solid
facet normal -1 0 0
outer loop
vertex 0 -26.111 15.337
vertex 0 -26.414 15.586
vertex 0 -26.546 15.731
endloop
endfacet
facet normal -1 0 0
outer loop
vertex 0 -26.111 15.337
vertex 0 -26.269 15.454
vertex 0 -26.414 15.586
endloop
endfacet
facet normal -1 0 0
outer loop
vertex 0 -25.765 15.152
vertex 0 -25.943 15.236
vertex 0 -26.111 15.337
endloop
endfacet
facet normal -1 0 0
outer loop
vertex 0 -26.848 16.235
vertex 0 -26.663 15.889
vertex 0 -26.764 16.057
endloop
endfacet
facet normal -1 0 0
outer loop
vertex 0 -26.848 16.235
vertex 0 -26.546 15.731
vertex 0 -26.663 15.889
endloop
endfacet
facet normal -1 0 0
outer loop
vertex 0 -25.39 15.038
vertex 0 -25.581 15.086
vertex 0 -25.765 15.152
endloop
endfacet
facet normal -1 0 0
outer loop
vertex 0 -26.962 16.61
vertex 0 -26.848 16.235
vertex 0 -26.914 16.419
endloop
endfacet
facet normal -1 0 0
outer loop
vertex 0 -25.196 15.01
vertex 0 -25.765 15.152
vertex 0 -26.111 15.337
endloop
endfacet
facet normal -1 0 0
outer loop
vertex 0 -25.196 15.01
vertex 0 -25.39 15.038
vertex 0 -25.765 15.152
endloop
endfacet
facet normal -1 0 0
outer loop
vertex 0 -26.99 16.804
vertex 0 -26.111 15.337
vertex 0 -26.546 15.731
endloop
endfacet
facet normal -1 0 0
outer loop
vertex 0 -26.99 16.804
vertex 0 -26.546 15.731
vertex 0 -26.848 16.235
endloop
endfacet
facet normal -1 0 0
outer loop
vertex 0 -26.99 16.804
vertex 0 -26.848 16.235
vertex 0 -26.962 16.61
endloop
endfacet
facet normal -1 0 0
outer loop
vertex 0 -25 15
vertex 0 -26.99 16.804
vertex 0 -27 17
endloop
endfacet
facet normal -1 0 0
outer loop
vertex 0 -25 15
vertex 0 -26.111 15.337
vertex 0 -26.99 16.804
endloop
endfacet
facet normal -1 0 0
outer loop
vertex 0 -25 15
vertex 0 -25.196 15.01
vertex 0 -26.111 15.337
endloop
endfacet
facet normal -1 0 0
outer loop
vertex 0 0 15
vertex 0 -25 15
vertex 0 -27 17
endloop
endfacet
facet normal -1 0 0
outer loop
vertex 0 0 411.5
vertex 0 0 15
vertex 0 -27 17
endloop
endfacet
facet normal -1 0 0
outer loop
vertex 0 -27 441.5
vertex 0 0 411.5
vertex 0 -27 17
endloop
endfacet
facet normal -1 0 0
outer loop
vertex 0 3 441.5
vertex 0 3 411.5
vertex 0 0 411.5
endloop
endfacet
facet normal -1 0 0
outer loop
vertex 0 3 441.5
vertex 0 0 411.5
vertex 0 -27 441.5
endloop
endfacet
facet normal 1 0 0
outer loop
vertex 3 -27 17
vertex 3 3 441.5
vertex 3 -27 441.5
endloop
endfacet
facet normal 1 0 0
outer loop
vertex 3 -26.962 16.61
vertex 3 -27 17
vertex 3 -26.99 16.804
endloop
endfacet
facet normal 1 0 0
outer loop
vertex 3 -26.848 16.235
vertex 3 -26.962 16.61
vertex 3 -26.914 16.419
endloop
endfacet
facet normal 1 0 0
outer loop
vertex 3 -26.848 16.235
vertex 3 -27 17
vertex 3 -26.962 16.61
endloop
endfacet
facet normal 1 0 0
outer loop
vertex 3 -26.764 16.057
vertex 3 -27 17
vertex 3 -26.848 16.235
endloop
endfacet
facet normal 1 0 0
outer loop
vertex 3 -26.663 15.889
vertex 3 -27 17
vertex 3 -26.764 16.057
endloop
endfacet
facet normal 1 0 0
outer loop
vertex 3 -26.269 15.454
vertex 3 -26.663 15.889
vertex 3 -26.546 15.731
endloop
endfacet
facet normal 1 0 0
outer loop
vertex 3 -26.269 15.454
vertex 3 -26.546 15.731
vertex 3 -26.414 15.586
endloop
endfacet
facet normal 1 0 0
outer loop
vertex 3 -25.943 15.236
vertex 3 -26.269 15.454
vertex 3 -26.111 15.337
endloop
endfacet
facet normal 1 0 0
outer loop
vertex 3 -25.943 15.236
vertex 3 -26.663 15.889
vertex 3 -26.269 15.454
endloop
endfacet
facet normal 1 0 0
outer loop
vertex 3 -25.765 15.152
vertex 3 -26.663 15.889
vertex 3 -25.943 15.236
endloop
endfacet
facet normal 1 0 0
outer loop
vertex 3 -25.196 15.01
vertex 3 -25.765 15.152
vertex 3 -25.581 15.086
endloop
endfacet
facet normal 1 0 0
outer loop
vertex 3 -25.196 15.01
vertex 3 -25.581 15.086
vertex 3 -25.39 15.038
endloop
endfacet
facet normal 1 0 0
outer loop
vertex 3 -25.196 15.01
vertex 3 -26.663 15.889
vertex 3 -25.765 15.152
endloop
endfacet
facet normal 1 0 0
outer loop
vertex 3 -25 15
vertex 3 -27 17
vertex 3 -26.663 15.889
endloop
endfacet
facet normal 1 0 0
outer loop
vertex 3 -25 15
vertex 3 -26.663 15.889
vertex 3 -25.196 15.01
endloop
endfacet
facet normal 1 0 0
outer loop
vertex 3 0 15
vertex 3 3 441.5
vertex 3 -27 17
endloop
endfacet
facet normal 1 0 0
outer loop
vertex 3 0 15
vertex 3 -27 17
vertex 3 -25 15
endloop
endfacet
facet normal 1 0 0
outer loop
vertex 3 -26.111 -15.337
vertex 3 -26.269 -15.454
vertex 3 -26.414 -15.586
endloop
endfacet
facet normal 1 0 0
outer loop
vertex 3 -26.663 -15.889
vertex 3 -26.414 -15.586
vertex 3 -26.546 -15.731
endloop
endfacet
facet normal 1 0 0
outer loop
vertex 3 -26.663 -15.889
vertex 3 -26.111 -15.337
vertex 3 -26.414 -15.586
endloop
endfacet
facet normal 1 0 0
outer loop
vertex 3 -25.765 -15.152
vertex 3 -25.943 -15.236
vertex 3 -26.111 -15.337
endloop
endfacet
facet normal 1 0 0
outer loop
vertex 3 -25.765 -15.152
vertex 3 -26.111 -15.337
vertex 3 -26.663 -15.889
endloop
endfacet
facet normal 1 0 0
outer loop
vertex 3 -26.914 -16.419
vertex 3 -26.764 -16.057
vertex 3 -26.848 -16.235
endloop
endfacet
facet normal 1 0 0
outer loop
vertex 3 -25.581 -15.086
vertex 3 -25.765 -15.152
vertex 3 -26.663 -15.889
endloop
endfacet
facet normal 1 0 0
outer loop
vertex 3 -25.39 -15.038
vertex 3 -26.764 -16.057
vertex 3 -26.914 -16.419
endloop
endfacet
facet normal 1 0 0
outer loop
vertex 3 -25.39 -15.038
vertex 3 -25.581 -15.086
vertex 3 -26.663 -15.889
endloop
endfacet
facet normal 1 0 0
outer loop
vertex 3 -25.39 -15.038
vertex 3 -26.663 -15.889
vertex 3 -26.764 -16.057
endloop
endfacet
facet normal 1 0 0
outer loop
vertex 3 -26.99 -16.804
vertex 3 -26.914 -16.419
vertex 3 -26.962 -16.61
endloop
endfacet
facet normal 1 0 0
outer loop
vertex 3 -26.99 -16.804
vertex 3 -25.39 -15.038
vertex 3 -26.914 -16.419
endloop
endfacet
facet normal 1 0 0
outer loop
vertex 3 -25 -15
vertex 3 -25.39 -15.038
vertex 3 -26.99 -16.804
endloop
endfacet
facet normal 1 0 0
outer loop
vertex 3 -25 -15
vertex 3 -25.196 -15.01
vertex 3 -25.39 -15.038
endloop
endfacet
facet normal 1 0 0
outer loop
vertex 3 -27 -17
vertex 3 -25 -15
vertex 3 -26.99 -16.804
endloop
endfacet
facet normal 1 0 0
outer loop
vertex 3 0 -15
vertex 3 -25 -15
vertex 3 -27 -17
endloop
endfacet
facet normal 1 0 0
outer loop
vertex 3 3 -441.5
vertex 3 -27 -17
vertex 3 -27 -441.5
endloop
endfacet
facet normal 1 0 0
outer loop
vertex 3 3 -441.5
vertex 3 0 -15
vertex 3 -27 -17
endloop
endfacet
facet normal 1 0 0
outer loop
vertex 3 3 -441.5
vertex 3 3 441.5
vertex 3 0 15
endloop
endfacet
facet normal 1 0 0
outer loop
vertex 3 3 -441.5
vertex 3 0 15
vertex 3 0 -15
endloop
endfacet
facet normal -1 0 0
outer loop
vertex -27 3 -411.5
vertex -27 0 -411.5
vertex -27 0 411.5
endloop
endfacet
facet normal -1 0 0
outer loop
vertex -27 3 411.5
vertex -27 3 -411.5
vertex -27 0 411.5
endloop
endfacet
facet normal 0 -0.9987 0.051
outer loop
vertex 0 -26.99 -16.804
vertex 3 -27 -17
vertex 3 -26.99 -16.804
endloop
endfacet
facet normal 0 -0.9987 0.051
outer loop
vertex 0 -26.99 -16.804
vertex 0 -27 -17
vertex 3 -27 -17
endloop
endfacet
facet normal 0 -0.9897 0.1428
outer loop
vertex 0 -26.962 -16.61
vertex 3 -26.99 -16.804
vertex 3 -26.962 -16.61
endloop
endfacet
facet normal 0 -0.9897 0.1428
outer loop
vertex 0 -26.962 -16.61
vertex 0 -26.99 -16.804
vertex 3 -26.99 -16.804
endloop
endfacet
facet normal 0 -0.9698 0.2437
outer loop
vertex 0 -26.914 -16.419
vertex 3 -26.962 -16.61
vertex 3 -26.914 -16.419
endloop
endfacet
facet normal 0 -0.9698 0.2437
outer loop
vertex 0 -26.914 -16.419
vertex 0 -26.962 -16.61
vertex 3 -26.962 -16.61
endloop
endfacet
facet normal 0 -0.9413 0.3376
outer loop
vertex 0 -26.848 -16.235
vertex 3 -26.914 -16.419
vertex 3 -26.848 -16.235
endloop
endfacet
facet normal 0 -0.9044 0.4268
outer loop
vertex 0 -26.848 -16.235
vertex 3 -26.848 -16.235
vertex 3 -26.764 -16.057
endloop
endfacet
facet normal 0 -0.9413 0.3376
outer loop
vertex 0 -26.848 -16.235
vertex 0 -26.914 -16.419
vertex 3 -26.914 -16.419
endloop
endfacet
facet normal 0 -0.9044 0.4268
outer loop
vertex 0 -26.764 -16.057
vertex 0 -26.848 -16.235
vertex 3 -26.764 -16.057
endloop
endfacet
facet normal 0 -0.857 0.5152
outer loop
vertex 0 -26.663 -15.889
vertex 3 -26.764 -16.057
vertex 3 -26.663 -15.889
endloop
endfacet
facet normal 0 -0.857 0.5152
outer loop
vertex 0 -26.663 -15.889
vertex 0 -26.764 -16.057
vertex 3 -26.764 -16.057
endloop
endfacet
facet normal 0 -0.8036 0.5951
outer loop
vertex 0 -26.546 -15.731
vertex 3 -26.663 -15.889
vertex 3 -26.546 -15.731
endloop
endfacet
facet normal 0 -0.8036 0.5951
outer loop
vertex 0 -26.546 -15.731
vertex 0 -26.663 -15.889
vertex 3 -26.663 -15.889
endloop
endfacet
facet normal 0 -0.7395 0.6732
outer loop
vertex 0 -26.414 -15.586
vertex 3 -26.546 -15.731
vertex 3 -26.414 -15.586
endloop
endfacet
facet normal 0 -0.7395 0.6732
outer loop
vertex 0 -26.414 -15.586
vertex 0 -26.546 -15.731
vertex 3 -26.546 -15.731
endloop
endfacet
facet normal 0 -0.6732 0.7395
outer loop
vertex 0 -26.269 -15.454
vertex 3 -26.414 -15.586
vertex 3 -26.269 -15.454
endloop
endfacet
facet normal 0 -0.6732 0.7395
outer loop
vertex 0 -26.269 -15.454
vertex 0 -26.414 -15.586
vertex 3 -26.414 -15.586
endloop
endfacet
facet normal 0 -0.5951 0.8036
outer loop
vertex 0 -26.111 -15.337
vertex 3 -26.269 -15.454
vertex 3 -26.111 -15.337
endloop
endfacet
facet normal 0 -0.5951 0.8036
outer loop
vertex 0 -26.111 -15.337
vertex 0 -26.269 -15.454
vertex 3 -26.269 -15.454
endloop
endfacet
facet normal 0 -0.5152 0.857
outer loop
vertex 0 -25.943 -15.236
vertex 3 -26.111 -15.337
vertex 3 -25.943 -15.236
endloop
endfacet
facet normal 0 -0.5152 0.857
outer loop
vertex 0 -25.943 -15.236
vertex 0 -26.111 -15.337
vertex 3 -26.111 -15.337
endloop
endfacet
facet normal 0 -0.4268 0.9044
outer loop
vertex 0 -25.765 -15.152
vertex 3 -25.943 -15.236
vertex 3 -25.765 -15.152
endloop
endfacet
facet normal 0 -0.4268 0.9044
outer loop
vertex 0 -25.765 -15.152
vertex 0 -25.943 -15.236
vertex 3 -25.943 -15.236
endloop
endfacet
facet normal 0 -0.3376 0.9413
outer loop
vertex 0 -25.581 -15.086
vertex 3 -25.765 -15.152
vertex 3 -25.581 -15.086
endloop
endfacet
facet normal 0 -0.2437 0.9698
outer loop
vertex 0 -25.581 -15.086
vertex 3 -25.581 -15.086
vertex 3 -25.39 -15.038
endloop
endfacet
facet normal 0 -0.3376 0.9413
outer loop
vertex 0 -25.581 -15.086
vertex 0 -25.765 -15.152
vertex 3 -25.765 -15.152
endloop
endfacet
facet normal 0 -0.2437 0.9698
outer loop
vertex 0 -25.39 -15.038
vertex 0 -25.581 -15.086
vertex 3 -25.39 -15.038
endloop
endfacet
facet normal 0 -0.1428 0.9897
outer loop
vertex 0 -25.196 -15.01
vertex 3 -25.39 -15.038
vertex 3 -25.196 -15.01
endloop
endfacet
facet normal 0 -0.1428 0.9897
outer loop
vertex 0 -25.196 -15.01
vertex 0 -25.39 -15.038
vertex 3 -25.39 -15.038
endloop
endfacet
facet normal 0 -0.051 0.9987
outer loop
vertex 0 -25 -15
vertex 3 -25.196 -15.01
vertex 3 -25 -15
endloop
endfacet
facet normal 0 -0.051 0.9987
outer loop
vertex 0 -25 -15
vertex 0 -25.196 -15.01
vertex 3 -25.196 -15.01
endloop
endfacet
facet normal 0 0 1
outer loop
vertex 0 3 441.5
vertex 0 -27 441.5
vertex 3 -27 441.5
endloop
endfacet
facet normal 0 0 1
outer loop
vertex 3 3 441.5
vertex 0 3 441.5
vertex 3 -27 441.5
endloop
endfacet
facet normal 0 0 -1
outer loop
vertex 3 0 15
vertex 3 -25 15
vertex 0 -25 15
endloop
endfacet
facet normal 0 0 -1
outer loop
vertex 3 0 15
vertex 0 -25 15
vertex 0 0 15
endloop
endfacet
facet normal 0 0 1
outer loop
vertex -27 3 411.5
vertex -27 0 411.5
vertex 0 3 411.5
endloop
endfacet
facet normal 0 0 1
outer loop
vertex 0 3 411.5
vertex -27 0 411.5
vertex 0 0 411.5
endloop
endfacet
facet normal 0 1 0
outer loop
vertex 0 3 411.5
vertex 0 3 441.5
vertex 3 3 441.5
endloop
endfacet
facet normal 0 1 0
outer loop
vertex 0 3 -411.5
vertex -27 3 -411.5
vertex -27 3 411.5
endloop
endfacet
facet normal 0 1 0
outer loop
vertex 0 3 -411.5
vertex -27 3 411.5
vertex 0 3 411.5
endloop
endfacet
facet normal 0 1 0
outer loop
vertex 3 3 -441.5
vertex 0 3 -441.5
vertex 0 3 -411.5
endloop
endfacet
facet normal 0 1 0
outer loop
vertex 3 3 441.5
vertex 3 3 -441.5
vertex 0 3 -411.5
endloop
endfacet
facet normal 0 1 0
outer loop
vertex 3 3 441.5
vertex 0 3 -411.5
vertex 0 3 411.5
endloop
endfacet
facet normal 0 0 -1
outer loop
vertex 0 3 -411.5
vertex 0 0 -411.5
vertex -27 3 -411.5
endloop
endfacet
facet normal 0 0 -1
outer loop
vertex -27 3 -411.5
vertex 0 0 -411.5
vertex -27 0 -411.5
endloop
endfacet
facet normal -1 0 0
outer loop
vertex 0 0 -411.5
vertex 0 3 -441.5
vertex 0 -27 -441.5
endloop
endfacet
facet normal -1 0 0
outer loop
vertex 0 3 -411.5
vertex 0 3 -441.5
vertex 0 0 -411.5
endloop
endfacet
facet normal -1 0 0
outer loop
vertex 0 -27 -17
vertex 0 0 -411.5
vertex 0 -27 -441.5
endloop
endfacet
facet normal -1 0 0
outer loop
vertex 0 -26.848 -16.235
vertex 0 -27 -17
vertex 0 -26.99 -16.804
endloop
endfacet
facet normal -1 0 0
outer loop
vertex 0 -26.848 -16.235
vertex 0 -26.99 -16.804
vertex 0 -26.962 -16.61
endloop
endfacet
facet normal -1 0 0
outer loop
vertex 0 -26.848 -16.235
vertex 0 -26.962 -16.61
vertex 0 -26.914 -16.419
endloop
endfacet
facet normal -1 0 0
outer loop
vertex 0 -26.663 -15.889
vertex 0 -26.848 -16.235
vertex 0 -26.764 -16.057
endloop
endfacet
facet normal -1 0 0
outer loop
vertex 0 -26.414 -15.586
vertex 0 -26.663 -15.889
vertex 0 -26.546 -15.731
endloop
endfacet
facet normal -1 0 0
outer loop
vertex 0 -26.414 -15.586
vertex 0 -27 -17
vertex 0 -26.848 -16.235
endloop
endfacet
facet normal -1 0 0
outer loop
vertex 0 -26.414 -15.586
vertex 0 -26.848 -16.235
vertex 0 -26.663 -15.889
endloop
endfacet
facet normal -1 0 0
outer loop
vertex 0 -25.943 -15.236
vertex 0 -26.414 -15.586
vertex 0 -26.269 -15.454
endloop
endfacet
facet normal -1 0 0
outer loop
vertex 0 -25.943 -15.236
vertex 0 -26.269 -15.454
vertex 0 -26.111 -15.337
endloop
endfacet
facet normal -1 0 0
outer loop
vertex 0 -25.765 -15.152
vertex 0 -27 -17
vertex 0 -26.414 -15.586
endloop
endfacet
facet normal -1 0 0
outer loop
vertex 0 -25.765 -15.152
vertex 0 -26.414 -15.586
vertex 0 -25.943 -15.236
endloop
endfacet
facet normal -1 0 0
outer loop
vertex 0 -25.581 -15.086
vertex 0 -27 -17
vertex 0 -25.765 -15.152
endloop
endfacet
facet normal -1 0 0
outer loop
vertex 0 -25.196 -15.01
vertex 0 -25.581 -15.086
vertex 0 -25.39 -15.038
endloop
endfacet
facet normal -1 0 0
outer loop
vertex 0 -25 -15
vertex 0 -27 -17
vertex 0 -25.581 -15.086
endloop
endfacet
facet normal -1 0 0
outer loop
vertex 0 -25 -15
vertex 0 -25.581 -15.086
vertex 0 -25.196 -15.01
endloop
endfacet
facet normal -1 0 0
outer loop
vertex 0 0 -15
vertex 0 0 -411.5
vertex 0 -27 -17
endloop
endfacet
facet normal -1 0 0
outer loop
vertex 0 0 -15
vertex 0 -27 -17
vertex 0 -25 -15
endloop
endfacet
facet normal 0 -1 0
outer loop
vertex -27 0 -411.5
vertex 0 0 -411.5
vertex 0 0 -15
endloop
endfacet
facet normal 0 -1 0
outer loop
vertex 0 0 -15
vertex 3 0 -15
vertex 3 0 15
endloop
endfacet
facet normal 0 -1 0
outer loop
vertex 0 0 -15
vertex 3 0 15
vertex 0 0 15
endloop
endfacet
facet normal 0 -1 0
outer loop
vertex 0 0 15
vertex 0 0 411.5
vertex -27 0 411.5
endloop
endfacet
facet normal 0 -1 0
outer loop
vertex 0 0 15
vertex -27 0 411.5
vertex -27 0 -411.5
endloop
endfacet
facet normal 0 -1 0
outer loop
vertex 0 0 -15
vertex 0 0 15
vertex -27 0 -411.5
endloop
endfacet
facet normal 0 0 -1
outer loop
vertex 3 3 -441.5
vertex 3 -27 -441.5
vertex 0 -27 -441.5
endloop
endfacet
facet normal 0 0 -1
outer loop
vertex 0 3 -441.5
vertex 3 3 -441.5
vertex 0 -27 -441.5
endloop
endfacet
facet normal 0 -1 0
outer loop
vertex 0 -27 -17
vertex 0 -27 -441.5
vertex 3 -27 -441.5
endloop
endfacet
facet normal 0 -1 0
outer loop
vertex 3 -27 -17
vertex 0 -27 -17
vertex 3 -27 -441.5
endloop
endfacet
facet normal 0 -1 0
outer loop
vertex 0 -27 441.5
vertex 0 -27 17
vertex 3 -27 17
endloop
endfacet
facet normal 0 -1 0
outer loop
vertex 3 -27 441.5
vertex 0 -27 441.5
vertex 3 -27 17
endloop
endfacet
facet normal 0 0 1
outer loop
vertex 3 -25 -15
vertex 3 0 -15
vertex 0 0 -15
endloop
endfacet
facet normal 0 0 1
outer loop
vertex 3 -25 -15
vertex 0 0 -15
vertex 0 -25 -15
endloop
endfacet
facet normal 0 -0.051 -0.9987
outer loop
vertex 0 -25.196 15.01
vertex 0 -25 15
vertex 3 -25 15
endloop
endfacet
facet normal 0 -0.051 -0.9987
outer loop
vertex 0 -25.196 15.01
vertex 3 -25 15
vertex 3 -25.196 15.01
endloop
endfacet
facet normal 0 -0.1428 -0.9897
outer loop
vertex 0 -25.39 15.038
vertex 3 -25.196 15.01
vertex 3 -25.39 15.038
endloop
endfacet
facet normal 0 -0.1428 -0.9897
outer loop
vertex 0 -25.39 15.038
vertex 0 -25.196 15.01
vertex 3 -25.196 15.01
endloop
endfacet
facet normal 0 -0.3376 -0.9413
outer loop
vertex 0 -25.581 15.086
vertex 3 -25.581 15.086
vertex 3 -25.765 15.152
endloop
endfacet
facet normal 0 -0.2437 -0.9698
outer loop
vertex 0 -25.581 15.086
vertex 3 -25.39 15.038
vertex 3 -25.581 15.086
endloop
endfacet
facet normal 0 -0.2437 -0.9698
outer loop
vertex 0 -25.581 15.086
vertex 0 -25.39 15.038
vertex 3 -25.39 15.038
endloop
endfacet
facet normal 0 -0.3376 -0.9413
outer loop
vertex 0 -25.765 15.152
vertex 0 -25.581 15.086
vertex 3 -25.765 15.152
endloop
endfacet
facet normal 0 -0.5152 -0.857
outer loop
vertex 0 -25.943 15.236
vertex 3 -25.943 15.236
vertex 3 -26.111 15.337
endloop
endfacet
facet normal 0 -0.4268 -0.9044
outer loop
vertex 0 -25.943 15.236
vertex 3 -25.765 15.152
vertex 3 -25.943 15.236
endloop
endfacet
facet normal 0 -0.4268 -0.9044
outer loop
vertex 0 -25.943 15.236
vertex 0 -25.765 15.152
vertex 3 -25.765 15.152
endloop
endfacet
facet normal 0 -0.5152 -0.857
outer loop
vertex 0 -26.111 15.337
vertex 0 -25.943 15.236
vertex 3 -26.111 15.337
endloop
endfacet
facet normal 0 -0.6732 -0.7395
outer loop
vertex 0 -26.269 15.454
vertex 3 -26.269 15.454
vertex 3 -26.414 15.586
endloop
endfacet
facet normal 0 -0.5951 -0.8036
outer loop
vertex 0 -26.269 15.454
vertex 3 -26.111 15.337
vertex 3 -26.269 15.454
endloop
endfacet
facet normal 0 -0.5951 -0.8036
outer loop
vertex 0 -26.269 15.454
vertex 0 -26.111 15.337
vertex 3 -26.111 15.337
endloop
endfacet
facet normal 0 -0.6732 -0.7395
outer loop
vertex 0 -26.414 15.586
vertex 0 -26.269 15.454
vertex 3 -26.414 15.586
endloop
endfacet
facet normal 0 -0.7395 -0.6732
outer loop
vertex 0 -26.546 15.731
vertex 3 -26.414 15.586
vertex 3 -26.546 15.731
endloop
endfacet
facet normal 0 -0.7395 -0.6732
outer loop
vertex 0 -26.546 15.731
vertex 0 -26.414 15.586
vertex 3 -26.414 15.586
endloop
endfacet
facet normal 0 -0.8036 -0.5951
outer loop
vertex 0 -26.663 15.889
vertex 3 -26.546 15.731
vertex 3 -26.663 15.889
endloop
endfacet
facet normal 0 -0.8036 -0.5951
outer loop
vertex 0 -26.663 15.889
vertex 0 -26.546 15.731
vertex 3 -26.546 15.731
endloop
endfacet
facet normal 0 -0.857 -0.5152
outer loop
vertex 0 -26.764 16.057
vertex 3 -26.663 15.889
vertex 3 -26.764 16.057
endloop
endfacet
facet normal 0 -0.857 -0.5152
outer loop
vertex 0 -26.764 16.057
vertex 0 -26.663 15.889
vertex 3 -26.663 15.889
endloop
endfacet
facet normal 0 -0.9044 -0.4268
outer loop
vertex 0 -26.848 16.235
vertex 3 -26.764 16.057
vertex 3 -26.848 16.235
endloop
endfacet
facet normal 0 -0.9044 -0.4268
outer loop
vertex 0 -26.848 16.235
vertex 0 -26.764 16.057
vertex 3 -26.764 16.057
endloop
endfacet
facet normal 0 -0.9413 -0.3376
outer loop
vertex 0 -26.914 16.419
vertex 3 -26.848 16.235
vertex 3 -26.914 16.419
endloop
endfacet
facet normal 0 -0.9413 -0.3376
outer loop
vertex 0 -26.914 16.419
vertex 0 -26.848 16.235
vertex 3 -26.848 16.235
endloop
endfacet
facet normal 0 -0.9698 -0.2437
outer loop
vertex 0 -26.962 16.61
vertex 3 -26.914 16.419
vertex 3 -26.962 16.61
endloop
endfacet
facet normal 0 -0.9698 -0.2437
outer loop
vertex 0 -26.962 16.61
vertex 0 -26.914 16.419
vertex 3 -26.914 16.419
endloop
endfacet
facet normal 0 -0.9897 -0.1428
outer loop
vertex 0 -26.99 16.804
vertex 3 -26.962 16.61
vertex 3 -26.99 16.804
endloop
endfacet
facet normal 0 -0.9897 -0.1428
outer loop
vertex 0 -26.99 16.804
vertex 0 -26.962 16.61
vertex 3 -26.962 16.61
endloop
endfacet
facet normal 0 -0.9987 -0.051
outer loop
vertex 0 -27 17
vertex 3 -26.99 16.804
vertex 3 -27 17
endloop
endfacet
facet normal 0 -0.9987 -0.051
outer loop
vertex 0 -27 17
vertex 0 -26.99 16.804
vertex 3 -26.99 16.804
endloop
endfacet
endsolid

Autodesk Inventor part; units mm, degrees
ref_plane "YZ Plane" through (0, 0, 0) normal (1, 0, 0) x (0, 1, 0)
ref_plane "XZ Plane" through (0, 0, 0) normal (0, 1, 0) x (-1, 0, 0)
ref_plane "XY Plane" through (0, 0, 0) normal (0, 0, 1) x (1, 0, 0)
sketch "Boceto1" plane through (0, 0, 0) normal (0, 1, 0) x (-1, 0, 0)
  line L0 (27, 411.5) -> (0, 411.5)
  line L1 (0, 411.5) -> (0, -411.5)
  line L2 (0, -411.5) -> (27, -411.5)
  line L3 (27, -411.5) -> (27, 411.5)
  line L4 (0, 0) -> (280.3389, 0)
  dimension "d0" = 823
  dimension "d1" = 27
extrude "Extrusión1" add sketch "Boceto1" along normal blind 3
sketch "Boceto2" plane through (0, 3, 0) normal (0, 1, 0) x (1, 0, 0)
  line L0 (0, -441.5) -> (3, -441.5)
  line L1 (3, -441.5) -> (3, 441.5)
  line L2 (3, 441.5) -> (0, 441.5)
  line L3 (0, 441.5) -> (0, -441.5)
  line L4 (0, 0) -> (-318.7817, 0)
  point P0 (0, -411.5)
  dimension "d4" = 883
  dimension "d5" = 3
extrude "Extrusión2" add sketch "Boceto2" against normal blind 30
sketch "Boceto3" plane through (3, 3, 441.5) normal (1, 0, 0) x (0, 0, -1)
  line L0 (883, -30) -> (0, -30) projected
  line L1 (441.5, -30) -> (441.5, 0)
  line L2 (853, 0) -> (30, 0) projected
  line L3 (456.5, -30) -> (426.5, -30)
  line L4 (426.5, -30) -> (426.5, 0)
  line L5 (426.5, 0) -> (456.5, 0)
  line L6 (456.5, 0) -> (456.5, -30)
  line L7 (0, 0) -> (883, 0) projected
  line L8 (30, -3) -> (853, -3) projected
  point P0 (441.5, -3)
  point P1 (456.5, -3)
  point P2 (426.5, -3)
  dimension "d8" = 30
extrude "Extrusión3" cut sketch "Boceto3" against normal blind 10 contours L0 L1 L8 L6 | L0 L4 L8 L1
fillet "Empalme1" radius 2 2 edges at (1.5, -27, 15) (1.5, -27, -15)
properties part number "A_3030_INT"
